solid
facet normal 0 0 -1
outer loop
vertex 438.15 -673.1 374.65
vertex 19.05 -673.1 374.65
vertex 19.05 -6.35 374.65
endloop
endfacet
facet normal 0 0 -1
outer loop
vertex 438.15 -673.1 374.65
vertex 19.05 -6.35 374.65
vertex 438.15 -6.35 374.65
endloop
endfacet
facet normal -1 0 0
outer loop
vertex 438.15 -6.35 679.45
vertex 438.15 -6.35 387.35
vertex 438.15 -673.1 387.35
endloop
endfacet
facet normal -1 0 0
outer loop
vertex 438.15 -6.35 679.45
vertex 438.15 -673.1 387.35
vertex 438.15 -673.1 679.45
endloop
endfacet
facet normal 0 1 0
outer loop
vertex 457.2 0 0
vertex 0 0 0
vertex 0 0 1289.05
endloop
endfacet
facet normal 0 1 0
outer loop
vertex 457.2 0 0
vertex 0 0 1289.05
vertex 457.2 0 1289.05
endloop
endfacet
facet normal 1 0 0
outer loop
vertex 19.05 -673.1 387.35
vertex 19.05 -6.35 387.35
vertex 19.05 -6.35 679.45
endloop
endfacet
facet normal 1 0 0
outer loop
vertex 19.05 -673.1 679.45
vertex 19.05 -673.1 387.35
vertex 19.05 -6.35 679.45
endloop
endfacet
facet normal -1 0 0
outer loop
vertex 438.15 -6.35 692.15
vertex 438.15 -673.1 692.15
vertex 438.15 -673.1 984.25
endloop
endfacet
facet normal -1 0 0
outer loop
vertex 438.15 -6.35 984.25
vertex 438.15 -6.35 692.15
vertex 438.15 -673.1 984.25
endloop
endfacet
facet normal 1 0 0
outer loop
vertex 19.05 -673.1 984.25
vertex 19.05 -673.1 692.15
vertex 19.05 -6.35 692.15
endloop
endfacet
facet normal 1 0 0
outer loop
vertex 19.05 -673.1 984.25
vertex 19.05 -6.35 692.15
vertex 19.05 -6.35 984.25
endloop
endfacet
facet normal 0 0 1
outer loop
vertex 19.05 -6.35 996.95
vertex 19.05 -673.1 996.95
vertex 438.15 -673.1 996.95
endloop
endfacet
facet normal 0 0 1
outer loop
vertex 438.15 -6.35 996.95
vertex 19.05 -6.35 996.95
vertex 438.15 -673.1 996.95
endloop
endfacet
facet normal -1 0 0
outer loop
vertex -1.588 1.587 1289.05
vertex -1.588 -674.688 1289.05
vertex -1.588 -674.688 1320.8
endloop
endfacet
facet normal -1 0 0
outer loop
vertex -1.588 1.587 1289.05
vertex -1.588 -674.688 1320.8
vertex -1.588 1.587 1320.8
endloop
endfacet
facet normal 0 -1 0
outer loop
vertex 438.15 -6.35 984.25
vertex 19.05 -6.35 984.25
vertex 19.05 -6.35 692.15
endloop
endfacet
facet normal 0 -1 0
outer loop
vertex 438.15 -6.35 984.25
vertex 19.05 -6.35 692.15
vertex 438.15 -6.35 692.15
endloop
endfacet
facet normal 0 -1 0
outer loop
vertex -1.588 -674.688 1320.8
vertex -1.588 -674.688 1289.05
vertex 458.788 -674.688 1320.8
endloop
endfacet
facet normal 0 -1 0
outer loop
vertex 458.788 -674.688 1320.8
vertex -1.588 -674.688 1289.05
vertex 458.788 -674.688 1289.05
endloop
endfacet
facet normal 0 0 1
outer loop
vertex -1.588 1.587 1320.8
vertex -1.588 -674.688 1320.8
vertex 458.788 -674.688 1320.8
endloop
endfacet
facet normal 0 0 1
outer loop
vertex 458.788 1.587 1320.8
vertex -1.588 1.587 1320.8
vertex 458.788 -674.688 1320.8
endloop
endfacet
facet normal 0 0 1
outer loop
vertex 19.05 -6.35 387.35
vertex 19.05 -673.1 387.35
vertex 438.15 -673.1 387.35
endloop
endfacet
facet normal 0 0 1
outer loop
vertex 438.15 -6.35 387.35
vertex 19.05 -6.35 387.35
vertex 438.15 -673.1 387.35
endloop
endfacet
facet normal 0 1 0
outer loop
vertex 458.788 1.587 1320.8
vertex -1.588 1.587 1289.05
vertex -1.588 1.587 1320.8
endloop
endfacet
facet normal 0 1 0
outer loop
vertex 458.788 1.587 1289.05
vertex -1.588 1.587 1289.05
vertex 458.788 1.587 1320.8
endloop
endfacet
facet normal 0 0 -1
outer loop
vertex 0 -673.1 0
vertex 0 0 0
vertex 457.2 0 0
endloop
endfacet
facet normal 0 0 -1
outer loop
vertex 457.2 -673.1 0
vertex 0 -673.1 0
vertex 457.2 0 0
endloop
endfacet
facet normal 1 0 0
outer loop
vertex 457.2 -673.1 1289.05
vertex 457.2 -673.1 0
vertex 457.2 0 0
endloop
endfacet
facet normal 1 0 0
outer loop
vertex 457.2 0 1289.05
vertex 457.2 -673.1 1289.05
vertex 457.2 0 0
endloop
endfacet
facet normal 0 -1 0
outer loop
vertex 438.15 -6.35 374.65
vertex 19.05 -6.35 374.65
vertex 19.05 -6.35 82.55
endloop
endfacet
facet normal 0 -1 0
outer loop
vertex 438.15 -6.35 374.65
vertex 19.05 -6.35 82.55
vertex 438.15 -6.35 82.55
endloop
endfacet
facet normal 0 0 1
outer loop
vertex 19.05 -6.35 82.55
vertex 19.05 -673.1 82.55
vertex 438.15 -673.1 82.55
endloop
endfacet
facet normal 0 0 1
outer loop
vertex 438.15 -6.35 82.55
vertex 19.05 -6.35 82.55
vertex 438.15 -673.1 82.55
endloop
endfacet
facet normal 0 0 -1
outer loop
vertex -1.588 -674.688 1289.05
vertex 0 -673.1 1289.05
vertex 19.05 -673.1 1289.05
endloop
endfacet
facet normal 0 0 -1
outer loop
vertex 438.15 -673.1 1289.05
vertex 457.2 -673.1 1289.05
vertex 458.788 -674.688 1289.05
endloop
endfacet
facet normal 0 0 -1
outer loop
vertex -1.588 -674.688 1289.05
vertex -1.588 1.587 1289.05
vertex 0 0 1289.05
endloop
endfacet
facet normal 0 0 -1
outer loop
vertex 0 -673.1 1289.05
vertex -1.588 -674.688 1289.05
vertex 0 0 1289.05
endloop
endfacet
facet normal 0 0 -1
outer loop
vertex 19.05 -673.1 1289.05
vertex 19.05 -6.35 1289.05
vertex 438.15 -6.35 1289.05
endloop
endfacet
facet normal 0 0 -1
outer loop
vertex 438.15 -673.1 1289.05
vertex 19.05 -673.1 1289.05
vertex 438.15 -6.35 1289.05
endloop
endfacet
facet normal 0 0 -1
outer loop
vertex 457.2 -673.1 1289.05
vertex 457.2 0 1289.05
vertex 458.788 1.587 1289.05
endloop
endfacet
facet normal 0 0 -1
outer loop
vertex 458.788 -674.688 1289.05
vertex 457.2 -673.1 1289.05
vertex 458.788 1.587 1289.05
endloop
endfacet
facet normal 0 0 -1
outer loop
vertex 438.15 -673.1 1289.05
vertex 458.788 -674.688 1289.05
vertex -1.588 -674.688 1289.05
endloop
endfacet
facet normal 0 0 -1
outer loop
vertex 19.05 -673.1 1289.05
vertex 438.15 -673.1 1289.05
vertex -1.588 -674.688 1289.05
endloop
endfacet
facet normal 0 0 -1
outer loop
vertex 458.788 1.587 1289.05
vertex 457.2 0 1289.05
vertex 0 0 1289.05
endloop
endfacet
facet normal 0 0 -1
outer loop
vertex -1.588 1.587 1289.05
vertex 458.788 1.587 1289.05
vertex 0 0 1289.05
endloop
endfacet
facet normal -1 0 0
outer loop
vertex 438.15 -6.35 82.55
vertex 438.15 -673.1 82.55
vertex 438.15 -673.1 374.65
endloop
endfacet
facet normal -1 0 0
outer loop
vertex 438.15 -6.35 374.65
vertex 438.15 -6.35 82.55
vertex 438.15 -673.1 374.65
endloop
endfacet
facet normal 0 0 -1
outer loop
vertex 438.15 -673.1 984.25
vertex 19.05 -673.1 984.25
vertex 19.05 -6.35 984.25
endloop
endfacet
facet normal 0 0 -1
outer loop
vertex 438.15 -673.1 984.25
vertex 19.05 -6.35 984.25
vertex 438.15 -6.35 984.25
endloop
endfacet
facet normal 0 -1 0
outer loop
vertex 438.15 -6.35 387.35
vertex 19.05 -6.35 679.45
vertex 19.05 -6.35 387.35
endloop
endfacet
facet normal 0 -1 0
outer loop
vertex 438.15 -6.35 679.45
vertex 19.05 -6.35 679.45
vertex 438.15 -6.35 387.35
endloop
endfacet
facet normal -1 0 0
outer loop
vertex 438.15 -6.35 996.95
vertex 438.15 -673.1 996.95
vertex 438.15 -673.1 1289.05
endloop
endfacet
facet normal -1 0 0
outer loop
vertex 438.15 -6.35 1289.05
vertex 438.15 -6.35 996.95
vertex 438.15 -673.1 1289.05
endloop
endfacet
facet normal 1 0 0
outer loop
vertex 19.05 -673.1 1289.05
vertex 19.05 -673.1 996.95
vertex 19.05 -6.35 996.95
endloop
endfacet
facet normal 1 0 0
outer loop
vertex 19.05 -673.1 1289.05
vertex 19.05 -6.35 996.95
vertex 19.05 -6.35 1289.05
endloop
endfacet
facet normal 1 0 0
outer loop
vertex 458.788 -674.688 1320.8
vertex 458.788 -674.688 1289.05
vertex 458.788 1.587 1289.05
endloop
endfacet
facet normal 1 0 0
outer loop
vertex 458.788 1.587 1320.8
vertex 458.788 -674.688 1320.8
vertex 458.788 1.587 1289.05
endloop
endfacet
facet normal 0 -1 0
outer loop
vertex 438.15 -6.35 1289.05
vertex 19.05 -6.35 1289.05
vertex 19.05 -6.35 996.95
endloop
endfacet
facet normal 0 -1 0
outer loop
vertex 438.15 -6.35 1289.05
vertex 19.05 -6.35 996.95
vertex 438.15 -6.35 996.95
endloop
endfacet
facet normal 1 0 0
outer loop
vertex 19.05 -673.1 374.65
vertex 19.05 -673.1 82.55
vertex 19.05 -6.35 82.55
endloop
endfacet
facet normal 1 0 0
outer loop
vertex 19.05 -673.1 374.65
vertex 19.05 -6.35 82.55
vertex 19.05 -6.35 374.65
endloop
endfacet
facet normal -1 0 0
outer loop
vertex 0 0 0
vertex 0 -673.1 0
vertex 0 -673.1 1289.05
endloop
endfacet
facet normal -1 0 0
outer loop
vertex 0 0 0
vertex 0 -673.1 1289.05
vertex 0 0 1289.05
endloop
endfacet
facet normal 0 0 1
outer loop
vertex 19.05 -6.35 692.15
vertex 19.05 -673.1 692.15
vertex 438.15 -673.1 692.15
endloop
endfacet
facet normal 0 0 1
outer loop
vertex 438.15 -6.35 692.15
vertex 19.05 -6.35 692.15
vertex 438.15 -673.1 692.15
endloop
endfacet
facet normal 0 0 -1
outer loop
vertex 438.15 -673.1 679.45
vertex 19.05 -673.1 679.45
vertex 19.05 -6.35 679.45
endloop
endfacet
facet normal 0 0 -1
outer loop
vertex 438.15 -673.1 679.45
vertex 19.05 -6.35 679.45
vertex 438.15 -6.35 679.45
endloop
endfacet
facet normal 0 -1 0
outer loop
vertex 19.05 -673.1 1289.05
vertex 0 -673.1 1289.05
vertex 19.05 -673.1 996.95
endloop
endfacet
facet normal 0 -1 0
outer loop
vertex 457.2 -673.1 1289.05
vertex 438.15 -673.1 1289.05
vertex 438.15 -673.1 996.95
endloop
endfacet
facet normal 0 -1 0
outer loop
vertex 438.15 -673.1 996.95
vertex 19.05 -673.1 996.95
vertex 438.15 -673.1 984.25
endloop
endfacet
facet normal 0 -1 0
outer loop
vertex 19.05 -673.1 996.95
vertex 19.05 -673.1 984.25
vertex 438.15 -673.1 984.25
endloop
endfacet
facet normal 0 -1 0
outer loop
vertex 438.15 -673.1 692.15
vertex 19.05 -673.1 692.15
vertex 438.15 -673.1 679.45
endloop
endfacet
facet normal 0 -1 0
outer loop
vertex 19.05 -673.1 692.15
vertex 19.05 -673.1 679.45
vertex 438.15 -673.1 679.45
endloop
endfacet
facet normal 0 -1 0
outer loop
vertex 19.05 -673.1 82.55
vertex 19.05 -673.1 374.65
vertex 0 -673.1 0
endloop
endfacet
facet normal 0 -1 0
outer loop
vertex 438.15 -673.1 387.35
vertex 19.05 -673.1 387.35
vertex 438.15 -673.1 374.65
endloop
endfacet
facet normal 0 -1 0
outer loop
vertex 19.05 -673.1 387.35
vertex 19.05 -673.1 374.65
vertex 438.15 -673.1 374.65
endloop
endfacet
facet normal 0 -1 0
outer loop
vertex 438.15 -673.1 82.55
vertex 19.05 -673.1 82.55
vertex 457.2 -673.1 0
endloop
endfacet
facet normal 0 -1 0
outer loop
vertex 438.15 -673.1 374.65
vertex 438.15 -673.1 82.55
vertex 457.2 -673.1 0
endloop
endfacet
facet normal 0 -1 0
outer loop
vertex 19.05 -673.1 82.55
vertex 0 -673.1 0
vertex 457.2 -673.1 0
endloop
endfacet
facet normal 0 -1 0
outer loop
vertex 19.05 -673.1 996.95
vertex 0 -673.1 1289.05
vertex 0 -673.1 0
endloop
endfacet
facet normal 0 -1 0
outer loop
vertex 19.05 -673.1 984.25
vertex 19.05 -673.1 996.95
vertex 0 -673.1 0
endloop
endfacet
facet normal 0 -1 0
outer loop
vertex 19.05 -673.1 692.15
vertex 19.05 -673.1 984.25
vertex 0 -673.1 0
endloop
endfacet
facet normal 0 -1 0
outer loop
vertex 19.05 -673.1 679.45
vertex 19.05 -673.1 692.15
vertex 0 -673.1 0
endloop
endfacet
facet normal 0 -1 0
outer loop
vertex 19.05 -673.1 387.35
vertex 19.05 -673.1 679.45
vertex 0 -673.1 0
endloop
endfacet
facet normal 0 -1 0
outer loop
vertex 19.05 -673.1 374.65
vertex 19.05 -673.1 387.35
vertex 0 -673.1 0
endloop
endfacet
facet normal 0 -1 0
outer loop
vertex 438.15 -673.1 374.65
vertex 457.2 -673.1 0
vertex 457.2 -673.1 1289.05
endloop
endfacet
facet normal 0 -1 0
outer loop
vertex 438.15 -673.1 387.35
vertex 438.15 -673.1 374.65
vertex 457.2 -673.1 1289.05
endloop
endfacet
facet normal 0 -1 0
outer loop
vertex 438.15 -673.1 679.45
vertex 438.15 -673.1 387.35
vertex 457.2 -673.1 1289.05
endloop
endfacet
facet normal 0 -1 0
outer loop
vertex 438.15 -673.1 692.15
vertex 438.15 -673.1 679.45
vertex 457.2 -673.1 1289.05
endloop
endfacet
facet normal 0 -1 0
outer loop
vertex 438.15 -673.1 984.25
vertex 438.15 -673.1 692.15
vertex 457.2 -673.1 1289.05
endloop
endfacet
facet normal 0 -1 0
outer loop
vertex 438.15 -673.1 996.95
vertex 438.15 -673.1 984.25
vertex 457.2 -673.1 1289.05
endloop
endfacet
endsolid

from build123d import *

# Parameters (mm, degrees)
F0_W     = 457.2
F0_H     = 673.1
F1_DEPTH = 1289.05
F2_W     = 460.375
F2_H     = 676.275
F2_W_2   = 457.2
F2_H_2   = 673.1
F3_DEPTH = 31.75
F4_W     = 419.1
F4_H     = 292.1
F5_DEPTH = 666.75


with BuildPart() as f1:
    # F0 (on Top) → F1 (new body)
    with BuildSketch(Plane.XY):
        with Locations((228.6, -336.55)):
            Rectangle(F0_W, F0_H)
    extrude(amount=F1_DEPTH)

    # F2 (on face) → F3 (join)
    with BuildSketch(Plane.XY.offset(1289.05)):
        with Locations((228.6, -336.55)):
            Rectangle(F2_W, F2_H)
        with Locations((228.6, -336.55)):
            Rectangle(F2_W_2, F2_H_2, mode=Mode.SUBTRACT)
        with Locations((228.6, -336.55)):
            Rectangle(F2_W_2, F2_H_2)
    extrude(amount=F3_DEPTH)

    # F4 (on face) → F5 (cut)
    with BuildSketch(Plane.XZ.offset(673.1)):
        with Locations((228.6, 1143)):
            Rectangle(F4_W, F4_H)
        with Locations((228.6, 838.2)):
            Rectangle(F4_W, F4_H)
        with Locations((228.6, 533.4)):
            Rectangle(F4_W, F4_H)
        with Locations((228.6, 228.6)):
            Rectangle(F4_W, F4_H)
    extrude(amount=-F5_DEPTH, mode=Mode.SUBTRACT)


solid = f1.part
